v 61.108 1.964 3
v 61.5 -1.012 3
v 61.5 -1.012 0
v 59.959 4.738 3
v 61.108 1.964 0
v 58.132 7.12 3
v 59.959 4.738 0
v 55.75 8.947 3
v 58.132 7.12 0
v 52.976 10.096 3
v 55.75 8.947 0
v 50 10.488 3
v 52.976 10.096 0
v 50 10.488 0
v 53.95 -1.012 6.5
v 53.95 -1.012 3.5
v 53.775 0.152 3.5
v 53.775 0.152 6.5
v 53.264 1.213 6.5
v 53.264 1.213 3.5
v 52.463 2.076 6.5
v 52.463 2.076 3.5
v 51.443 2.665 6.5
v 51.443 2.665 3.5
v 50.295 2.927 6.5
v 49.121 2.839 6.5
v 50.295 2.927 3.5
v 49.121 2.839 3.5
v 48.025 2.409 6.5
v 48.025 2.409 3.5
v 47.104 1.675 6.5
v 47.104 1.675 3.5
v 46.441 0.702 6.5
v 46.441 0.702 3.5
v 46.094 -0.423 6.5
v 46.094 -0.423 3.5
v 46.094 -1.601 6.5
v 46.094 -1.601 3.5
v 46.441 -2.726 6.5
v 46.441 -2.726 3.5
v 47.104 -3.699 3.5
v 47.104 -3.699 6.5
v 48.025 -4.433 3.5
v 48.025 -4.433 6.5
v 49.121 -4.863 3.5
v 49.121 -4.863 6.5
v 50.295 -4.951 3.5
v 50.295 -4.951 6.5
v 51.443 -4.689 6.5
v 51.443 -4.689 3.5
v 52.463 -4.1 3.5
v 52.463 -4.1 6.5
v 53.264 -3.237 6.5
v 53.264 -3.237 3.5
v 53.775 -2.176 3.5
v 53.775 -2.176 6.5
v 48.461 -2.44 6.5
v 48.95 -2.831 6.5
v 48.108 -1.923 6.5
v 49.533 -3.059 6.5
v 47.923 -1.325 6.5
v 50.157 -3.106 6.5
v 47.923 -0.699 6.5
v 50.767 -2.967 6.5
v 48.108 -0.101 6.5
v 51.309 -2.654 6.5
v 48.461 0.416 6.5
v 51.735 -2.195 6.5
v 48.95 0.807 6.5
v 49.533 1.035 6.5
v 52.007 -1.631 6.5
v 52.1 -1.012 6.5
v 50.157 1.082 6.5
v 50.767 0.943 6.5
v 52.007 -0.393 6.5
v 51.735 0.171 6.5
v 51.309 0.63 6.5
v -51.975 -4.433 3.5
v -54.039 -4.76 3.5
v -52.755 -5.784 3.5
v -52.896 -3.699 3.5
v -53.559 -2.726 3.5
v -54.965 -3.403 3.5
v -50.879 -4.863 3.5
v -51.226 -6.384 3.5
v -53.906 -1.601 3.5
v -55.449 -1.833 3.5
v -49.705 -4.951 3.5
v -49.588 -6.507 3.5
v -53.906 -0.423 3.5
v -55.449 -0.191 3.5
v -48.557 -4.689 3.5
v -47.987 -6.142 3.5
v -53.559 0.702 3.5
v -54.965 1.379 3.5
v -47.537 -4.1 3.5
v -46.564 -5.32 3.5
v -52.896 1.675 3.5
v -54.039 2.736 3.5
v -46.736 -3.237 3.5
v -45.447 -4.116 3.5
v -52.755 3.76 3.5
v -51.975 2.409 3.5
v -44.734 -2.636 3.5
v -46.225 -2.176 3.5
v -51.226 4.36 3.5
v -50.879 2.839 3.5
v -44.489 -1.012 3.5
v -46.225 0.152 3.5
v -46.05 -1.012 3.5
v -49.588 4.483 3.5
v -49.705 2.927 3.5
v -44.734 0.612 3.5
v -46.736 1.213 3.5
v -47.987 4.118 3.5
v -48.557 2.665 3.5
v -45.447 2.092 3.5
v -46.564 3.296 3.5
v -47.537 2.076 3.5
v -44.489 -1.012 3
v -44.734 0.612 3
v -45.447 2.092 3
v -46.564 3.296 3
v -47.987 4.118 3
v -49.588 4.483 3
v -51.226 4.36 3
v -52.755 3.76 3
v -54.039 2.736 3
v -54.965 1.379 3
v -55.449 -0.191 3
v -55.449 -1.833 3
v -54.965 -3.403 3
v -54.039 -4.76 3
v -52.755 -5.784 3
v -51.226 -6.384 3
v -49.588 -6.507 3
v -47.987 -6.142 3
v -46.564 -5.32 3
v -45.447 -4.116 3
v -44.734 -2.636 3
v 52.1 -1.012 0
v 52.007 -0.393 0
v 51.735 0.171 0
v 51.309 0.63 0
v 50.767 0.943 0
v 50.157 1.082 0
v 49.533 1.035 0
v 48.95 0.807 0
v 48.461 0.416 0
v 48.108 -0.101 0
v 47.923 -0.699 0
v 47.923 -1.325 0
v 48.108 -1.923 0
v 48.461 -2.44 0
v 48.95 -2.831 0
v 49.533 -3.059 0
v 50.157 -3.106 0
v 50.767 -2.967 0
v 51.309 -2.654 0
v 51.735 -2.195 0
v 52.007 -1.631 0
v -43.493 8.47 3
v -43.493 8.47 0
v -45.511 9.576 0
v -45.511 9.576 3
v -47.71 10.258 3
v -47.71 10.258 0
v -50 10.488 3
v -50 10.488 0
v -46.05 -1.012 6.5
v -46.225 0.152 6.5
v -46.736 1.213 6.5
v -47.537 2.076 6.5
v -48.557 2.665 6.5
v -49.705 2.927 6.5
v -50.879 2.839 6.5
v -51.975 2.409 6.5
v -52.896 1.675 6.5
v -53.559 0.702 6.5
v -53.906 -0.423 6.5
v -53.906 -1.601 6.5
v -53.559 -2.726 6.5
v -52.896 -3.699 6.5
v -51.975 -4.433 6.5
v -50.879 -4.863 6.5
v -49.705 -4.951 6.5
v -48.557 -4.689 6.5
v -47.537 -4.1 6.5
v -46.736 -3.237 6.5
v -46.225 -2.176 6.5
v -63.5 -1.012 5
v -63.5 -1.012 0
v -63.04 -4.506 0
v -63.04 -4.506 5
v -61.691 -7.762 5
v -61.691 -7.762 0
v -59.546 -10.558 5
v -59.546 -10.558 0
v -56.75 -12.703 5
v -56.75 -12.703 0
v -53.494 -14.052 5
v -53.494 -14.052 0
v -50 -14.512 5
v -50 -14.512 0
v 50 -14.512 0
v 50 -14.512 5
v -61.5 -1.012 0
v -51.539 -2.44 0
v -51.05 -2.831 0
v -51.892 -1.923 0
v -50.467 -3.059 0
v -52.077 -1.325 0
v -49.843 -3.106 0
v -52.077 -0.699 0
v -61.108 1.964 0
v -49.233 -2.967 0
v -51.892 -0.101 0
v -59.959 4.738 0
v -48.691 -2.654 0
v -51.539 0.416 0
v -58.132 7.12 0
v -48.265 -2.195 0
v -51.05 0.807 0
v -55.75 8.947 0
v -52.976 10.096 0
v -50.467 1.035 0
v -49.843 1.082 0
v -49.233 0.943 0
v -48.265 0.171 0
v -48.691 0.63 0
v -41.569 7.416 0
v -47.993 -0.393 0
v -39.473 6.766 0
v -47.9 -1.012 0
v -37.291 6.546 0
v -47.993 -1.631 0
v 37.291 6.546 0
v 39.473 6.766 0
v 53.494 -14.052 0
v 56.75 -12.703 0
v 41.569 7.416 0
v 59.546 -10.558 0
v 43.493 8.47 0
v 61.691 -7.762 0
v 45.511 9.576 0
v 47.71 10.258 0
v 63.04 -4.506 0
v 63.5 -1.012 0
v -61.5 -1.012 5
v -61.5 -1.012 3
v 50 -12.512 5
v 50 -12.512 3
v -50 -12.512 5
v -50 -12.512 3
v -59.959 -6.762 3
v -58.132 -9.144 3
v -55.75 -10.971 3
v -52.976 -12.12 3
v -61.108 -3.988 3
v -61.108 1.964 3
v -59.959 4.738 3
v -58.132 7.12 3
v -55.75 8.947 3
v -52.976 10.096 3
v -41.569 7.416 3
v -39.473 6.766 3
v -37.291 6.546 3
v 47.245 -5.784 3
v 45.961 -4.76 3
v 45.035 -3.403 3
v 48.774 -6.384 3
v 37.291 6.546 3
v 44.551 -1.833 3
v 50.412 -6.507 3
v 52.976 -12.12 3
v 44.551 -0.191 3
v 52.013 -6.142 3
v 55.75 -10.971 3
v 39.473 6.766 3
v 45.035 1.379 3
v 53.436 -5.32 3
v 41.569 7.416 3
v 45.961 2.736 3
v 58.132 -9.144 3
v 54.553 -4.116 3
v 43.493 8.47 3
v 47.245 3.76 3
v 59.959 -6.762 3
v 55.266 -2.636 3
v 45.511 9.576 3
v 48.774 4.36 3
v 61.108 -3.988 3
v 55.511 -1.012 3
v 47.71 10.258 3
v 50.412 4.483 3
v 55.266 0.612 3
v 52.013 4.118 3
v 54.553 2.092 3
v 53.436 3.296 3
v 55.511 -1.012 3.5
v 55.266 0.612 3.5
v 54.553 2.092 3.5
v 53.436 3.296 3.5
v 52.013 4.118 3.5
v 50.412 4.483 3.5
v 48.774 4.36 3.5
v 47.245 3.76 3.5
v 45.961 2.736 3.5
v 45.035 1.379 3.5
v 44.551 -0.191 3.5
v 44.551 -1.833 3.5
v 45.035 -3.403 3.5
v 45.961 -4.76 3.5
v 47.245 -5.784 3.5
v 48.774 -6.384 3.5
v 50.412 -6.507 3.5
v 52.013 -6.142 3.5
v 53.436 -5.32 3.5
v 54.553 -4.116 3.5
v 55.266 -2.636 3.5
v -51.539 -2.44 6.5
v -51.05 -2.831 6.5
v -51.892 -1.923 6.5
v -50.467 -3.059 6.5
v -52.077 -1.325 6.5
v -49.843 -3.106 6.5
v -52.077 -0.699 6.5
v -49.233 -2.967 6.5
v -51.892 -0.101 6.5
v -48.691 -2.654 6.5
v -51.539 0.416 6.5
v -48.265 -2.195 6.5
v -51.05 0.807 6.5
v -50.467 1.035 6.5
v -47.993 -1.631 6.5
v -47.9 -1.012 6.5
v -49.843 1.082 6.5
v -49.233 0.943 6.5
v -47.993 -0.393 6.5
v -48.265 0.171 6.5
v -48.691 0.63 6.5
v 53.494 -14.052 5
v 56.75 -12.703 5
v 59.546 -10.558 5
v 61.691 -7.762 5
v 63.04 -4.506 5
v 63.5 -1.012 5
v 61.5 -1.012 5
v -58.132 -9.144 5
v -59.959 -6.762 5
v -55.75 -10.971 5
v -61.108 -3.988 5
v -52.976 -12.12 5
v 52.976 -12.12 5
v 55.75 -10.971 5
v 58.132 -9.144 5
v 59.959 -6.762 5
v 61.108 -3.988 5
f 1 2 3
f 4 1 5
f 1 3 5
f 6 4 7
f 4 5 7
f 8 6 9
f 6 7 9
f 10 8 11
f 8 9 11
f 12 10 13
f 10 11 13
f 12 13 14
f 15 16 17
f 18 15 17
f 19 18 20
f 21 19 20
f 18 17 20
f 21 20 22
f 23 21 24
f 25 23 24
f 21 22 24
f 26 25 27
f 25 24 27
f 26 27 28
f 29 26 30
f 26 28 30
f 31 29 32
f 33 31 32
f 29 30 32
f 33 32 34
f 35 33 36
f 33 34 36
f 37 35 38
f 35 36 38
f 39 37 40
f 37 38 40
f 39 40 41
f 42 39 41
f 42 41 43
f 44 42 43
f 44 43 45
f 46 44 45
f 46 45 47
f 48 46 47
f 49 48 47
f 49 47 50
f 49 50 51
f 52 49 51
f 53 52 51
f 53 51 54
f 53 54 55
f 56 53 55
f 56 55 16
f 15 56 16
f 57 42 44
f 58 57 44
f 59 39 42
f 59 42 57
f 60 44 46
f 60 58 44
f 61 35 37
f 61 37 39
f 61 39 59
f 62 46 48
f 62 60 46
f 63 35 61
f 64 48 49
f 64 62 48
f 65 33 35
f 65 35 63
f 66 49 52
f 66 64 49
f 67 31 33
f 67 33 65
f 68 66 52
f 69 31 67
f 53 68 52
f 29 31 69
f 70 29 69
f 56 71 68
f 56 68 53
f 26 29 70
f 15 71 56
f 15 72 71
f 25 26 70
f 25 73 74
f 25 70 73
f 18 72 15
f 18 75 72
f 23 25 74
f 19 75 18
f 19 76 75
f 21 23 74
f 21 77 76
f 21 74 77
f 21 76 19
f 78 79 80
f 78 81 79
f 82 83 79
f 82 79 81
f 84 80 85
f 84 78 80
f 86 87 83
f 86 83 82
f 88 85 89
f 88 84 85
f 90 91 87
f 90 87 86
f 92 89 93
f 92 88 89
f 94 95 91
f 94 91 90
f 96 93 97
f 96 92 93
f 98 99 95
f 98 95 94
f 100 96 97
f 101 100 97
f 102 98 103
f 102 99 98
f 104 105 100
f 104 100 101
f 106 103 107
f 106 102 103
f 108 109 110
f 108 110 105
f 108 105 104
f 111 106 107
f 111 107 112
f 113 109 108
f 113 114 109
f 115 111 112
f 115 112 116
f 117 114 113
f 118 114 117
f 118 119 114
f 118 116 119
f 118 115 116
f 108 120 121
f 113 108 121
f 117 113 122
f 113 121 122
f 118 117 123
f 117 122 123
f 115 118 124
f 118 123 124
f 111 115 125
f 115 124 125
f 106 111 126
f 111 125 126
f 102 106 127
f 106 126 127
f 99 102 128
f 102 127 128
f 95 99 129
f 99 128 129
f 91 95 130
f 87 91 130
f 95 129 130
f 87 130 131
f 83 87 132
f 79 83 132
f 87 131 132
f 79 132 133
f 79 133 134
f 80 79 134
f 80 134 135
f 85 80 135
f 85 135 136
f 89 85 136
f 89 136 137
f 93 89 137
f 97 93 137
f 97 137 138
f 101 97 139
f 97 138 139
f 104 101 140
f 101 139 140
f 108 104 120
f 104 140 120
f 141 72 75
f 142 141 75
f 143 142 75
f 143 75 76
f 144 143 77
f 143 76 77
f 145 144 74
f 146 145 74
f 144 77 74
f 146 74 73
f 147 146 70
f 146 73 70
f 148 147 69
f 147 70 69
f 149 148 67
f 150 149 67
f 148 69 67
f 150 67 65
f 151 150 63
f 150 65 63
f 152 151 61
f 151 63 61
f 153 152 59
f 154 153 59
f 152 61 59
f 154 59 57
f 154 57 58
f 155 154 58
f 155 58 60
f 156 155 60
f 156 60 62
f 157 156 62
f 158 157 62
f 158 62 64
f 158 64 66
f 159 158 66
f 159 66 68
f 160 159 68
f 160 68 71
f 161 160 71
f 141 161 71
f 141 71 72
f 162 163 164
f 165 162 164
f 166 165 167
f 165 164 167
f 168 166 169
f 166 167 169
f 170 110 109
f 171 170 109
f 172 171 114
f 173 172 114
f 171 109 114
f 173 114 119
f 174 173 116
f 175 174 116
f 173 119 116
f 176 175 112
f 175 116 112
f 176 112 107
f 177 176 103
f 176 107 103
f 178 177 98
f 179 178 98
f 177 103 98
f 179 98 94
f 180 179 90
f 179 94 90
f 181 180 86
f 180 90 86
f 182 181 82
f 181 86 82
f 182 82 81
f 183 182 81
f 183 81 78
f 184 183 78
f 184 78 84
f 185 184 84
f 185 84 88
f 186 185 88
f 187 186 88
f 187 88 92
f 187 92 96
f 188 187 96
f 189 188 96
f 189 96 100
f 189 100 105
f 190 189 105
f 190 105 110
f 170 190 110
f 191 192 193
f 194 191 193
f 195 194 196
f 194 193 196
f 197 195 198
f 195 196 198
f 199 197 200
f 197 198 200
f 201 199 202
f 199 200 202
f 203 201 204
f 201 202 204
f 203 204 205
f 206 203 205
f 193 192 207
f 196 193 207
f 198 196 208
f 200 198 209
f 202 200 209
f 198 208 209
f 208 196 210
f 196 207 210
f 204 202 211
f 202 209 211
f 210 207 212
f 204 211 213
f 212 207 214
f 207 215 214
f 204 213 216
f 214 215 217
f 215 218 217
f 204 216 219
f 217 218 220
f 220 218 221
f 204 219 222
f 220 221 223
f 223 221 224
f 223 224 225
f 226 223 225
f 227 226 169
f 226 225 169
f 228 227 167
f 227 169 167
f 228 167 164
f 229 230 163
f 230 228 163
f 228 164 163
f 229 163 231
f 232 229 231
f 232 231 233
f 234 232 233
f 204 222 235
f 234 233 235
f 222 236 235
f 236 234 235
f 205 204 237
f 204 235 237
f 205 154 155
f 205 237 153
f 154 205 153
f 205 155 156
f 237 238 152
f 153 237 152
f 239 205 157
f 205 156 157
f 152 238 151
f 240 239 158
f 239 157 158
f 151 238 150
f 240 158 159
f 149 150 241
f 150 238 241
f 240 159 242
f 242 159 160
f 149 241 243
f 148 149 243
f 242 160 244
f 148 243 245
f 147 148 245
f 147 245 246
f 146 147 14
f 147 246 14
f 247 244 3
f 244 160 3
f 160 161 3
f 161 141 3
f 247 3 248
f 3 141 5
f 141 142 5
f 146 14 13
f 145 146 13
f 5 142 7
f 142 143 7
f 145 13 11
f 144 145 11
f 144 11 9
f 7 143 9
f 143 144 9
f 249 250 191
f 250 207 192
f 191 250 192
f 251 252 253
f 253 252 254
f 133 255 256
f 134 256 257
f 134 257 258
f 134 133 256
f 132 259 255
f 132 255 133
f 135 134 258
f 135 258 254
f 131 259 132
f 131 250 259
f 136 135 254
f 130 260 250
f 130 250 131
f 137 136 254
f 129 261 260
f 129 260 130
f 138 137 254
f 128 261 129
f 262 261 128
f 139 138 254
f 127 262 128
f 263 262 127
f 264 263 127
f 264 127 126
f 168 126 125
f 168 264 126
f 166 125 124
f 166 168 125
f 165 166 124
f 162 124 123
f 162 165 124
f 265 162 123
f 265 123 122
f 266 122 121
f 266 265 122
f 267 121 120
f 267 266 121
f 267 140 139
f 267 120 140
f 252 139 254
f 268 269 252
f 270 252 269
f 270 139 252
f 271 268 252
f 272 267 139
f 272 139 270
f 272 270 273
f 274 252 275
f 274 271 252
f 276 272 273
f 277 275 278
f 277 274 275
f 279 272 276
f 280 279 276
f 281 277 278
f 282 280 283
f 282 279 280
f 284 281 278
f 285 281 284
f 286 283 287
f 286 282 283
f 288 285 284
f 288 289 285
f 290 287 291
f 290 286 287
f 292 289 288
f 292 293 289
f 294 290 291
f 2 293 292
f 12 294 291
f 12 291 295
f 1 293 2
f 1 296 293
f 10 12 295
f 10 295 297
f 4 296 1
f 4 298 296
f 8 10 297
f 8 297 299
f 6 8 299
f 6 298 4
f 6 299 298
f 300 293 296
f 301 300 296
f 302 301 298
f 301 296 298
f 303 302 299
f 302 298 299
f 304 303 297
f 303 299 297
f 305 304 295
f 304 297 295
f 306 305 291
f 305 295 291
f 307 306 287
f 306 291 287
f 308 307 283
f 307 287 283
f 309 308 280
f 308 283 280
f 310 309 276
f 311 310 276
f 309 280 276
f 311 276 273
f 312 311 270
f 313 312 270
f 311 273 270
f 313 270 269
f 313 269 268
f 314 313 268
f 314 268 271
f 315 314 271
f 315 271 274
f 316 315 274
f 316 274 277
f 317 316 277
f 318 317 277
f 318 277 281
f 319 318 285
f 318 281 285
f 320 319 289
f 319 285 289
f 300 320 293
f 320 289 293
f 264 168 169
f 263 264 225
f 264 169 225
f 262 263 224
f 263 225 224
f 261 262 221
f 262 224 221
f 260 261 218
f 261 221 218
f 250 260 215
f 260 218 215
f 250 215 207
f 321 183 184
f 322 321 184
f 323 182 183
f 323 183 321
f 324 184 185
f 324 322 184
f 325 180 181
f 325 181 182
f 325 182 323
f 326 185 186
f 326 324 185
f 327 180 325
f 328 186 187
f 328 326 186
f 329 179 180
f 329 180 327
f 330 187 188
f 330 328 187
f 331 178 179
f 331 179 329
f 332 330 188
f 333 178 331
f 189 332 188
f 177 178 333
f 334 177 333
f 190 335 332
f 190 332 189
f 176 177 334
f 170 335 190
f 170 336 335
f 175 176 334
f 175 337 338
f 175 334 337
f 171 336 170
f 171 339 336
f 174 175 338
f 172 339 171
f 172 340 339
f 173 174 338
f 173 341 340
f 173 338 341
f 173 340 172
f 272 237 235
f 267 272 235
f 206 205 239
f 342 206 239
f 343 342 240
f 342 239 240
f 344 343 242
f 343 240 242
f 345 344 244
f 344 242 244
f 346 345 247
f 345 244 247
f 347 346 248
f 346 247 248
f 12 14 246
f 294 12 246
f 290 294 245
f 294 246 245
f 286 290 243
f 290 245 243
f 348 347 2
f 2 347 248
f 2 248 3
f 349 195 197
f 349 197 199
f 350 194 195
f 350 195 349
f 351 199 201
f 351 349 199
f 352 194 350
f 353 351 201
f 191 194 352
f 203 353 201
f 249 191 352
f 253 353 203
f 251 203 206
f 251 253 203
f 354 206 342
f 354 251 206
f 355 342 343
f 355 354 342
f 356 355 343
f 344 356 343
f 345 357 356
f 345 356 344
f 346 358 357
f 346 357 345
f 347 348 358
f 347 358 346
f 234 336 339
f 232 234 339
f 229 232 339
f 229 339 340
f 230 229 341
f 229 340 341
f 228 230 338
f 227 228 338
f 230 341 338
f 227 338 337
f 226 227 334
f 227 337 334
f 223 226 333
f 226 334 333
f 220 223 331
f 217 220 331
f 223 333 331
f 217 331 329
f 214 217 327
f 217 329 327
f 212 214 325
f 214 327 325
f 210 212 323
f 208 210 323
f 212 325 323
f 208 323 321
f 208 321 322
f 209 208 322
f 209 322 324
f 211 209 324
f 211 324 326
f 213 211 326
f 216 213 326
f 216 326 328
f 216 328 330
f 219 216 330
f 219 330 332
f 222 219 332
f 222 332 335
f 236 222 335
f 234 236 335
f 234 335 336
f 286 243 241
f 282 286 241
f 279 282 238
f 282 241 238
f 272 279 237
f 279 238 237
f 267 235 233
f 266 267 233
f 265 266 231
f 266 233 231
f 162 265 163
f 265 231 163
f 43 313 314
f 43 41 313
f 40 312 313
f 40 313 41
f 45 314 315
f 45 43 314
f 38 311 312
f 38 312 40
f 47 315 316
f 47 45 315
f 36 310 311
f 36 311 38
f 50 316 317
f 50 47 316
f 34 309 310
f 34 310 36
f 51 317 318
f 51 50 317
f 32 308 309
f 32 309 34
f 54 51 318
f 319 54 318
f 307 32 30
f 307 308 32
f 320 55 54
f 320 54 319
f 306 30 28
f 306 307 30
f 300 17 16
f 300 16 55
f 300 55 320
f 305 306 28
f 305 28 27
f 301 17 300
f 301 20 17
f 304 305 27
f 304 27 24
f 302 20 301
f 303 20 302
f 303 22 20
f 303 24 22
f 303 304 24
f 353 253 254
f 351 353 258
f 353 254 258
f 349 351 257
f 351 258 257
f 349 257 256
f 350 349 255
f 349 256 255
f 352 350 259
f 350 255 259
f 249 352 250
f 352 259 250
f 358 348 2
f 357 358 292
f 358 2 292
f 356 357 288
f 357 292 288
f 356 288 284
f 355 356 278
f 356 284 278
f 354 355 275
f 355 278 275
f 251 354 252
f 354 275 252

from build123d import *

# Parameters (mm, degrees)
F1_DEPTH = 3
F3_DEPTH = 5
F4_R     = 3.95
F5_DEPTH = 3.5
F6_R     = 2.1
F7_DEPTH = 25
F8_R     = 5.510522
F8_R_2   = 3.95
F9_DEPTH = 0.5


with BuildPart() as f1:
    # F0 (on Top) → F1 (new body)
    with BuildSketch(Plane.XY):
        with BuildLine():
            ThreePointArc((-50, 10.487979), (-61.5, -1.012021), (-50, -12.512021))
            Line((-50, -12.512021), (0, -12.512021))
            Line((0, -12.512021), (50, -12.512021))
            ThreePointArc((50, -12.512021), (61.5, -1.012021), (50, 10.487979))
            ThreePointArc((50, 10.487979), (46.593573, 9.971888), (43.49289, 8.469937))
            ThreePointArc((43.49289, 8.469937), (40.537466, 7.038348), (37.290622, 6.546434))
            Line((37.290622, 6.546434), (0, 6.546434))
            Line((0, 6.546434), (-37.290622, 6.546434))
            ThreePointArc((-37.290622, 6.546434), (-40.537466, 7.038348), (-43.49289, 8.469937))
            ThreePointArc((-43.49289, 8.469937), (-46.593573, 9.971888), (-50, 10.487979))
        make_face()
    extrude(amount=F1_DEPTH)

    # F2 (on face) → F3 (join)
    with BuildSketch(Plane.XY):
        with BuildLine():
            ThreePointArc((-63.5, -1.012021), (-59.545942, -10.557963), (-50, -14.512021))
            Line((-50, -14.512021), (50, -14.512021))
            ThreePointArc((50, -14.512021), (59.545942, -10.557963), (63.5, -1.012021))
            Line((63.5, -1.012021), (61.5, -1.012021))
            ThreePointArc((61.5, -1.012021), (58.131728, -9.143749), (50, -12.512021))
            Line((50, -12.512021), (-50, -12.512021))
            ThreePointArc((-50, -12.512021), (-58.131728, -9.143749), (-61.5, -1.012021))
            Line((-61.5, -1.012021), (-63.5, -1.012021))
        make_face()
    extrude(amount=F3_DEPTH)

    # F4 (on face) → F5 (join)
    with BuildSketch(Plane.XY.offset(3)):
        with Locations((-50, -1.012021)):
            Circle(F4_R)
        with Locations((50, -1.012021)):
            Circle(F4_R)
    extrude(amount=F5_DEPTH)

    # F6 (on face) → F7 (cut)
    with BuildSketch(Plane.XY.offset(6.5)):
        with Locations((-50, -1.012021)):
            Circle(F6_R)
        with Locations((50, -1.012021)):
            Circle(F6_R)
    extrude(amount=-F7_DEPTH, mode=Mode.SUBTRACT)

    # F8 (on face) → F9 (join)
    with BuildSketch(Plane.XY.offset(3)):
        with Locations((-50, -1.012021)):
            Circle(F8_R)
        with Locations((-50, -1.012021)):
            Circle(F8_R_2, mode=Mode.SUBTRACT)
        with Locations((50, -1.012021)):
            Circle(F8_R)
        with Locations((50, -1.012021)):
            Circle(F8_R_2, mode=Mode.SUBTRACT)
    extrude(amount=F9_DEPTH)


solid = f1.part
